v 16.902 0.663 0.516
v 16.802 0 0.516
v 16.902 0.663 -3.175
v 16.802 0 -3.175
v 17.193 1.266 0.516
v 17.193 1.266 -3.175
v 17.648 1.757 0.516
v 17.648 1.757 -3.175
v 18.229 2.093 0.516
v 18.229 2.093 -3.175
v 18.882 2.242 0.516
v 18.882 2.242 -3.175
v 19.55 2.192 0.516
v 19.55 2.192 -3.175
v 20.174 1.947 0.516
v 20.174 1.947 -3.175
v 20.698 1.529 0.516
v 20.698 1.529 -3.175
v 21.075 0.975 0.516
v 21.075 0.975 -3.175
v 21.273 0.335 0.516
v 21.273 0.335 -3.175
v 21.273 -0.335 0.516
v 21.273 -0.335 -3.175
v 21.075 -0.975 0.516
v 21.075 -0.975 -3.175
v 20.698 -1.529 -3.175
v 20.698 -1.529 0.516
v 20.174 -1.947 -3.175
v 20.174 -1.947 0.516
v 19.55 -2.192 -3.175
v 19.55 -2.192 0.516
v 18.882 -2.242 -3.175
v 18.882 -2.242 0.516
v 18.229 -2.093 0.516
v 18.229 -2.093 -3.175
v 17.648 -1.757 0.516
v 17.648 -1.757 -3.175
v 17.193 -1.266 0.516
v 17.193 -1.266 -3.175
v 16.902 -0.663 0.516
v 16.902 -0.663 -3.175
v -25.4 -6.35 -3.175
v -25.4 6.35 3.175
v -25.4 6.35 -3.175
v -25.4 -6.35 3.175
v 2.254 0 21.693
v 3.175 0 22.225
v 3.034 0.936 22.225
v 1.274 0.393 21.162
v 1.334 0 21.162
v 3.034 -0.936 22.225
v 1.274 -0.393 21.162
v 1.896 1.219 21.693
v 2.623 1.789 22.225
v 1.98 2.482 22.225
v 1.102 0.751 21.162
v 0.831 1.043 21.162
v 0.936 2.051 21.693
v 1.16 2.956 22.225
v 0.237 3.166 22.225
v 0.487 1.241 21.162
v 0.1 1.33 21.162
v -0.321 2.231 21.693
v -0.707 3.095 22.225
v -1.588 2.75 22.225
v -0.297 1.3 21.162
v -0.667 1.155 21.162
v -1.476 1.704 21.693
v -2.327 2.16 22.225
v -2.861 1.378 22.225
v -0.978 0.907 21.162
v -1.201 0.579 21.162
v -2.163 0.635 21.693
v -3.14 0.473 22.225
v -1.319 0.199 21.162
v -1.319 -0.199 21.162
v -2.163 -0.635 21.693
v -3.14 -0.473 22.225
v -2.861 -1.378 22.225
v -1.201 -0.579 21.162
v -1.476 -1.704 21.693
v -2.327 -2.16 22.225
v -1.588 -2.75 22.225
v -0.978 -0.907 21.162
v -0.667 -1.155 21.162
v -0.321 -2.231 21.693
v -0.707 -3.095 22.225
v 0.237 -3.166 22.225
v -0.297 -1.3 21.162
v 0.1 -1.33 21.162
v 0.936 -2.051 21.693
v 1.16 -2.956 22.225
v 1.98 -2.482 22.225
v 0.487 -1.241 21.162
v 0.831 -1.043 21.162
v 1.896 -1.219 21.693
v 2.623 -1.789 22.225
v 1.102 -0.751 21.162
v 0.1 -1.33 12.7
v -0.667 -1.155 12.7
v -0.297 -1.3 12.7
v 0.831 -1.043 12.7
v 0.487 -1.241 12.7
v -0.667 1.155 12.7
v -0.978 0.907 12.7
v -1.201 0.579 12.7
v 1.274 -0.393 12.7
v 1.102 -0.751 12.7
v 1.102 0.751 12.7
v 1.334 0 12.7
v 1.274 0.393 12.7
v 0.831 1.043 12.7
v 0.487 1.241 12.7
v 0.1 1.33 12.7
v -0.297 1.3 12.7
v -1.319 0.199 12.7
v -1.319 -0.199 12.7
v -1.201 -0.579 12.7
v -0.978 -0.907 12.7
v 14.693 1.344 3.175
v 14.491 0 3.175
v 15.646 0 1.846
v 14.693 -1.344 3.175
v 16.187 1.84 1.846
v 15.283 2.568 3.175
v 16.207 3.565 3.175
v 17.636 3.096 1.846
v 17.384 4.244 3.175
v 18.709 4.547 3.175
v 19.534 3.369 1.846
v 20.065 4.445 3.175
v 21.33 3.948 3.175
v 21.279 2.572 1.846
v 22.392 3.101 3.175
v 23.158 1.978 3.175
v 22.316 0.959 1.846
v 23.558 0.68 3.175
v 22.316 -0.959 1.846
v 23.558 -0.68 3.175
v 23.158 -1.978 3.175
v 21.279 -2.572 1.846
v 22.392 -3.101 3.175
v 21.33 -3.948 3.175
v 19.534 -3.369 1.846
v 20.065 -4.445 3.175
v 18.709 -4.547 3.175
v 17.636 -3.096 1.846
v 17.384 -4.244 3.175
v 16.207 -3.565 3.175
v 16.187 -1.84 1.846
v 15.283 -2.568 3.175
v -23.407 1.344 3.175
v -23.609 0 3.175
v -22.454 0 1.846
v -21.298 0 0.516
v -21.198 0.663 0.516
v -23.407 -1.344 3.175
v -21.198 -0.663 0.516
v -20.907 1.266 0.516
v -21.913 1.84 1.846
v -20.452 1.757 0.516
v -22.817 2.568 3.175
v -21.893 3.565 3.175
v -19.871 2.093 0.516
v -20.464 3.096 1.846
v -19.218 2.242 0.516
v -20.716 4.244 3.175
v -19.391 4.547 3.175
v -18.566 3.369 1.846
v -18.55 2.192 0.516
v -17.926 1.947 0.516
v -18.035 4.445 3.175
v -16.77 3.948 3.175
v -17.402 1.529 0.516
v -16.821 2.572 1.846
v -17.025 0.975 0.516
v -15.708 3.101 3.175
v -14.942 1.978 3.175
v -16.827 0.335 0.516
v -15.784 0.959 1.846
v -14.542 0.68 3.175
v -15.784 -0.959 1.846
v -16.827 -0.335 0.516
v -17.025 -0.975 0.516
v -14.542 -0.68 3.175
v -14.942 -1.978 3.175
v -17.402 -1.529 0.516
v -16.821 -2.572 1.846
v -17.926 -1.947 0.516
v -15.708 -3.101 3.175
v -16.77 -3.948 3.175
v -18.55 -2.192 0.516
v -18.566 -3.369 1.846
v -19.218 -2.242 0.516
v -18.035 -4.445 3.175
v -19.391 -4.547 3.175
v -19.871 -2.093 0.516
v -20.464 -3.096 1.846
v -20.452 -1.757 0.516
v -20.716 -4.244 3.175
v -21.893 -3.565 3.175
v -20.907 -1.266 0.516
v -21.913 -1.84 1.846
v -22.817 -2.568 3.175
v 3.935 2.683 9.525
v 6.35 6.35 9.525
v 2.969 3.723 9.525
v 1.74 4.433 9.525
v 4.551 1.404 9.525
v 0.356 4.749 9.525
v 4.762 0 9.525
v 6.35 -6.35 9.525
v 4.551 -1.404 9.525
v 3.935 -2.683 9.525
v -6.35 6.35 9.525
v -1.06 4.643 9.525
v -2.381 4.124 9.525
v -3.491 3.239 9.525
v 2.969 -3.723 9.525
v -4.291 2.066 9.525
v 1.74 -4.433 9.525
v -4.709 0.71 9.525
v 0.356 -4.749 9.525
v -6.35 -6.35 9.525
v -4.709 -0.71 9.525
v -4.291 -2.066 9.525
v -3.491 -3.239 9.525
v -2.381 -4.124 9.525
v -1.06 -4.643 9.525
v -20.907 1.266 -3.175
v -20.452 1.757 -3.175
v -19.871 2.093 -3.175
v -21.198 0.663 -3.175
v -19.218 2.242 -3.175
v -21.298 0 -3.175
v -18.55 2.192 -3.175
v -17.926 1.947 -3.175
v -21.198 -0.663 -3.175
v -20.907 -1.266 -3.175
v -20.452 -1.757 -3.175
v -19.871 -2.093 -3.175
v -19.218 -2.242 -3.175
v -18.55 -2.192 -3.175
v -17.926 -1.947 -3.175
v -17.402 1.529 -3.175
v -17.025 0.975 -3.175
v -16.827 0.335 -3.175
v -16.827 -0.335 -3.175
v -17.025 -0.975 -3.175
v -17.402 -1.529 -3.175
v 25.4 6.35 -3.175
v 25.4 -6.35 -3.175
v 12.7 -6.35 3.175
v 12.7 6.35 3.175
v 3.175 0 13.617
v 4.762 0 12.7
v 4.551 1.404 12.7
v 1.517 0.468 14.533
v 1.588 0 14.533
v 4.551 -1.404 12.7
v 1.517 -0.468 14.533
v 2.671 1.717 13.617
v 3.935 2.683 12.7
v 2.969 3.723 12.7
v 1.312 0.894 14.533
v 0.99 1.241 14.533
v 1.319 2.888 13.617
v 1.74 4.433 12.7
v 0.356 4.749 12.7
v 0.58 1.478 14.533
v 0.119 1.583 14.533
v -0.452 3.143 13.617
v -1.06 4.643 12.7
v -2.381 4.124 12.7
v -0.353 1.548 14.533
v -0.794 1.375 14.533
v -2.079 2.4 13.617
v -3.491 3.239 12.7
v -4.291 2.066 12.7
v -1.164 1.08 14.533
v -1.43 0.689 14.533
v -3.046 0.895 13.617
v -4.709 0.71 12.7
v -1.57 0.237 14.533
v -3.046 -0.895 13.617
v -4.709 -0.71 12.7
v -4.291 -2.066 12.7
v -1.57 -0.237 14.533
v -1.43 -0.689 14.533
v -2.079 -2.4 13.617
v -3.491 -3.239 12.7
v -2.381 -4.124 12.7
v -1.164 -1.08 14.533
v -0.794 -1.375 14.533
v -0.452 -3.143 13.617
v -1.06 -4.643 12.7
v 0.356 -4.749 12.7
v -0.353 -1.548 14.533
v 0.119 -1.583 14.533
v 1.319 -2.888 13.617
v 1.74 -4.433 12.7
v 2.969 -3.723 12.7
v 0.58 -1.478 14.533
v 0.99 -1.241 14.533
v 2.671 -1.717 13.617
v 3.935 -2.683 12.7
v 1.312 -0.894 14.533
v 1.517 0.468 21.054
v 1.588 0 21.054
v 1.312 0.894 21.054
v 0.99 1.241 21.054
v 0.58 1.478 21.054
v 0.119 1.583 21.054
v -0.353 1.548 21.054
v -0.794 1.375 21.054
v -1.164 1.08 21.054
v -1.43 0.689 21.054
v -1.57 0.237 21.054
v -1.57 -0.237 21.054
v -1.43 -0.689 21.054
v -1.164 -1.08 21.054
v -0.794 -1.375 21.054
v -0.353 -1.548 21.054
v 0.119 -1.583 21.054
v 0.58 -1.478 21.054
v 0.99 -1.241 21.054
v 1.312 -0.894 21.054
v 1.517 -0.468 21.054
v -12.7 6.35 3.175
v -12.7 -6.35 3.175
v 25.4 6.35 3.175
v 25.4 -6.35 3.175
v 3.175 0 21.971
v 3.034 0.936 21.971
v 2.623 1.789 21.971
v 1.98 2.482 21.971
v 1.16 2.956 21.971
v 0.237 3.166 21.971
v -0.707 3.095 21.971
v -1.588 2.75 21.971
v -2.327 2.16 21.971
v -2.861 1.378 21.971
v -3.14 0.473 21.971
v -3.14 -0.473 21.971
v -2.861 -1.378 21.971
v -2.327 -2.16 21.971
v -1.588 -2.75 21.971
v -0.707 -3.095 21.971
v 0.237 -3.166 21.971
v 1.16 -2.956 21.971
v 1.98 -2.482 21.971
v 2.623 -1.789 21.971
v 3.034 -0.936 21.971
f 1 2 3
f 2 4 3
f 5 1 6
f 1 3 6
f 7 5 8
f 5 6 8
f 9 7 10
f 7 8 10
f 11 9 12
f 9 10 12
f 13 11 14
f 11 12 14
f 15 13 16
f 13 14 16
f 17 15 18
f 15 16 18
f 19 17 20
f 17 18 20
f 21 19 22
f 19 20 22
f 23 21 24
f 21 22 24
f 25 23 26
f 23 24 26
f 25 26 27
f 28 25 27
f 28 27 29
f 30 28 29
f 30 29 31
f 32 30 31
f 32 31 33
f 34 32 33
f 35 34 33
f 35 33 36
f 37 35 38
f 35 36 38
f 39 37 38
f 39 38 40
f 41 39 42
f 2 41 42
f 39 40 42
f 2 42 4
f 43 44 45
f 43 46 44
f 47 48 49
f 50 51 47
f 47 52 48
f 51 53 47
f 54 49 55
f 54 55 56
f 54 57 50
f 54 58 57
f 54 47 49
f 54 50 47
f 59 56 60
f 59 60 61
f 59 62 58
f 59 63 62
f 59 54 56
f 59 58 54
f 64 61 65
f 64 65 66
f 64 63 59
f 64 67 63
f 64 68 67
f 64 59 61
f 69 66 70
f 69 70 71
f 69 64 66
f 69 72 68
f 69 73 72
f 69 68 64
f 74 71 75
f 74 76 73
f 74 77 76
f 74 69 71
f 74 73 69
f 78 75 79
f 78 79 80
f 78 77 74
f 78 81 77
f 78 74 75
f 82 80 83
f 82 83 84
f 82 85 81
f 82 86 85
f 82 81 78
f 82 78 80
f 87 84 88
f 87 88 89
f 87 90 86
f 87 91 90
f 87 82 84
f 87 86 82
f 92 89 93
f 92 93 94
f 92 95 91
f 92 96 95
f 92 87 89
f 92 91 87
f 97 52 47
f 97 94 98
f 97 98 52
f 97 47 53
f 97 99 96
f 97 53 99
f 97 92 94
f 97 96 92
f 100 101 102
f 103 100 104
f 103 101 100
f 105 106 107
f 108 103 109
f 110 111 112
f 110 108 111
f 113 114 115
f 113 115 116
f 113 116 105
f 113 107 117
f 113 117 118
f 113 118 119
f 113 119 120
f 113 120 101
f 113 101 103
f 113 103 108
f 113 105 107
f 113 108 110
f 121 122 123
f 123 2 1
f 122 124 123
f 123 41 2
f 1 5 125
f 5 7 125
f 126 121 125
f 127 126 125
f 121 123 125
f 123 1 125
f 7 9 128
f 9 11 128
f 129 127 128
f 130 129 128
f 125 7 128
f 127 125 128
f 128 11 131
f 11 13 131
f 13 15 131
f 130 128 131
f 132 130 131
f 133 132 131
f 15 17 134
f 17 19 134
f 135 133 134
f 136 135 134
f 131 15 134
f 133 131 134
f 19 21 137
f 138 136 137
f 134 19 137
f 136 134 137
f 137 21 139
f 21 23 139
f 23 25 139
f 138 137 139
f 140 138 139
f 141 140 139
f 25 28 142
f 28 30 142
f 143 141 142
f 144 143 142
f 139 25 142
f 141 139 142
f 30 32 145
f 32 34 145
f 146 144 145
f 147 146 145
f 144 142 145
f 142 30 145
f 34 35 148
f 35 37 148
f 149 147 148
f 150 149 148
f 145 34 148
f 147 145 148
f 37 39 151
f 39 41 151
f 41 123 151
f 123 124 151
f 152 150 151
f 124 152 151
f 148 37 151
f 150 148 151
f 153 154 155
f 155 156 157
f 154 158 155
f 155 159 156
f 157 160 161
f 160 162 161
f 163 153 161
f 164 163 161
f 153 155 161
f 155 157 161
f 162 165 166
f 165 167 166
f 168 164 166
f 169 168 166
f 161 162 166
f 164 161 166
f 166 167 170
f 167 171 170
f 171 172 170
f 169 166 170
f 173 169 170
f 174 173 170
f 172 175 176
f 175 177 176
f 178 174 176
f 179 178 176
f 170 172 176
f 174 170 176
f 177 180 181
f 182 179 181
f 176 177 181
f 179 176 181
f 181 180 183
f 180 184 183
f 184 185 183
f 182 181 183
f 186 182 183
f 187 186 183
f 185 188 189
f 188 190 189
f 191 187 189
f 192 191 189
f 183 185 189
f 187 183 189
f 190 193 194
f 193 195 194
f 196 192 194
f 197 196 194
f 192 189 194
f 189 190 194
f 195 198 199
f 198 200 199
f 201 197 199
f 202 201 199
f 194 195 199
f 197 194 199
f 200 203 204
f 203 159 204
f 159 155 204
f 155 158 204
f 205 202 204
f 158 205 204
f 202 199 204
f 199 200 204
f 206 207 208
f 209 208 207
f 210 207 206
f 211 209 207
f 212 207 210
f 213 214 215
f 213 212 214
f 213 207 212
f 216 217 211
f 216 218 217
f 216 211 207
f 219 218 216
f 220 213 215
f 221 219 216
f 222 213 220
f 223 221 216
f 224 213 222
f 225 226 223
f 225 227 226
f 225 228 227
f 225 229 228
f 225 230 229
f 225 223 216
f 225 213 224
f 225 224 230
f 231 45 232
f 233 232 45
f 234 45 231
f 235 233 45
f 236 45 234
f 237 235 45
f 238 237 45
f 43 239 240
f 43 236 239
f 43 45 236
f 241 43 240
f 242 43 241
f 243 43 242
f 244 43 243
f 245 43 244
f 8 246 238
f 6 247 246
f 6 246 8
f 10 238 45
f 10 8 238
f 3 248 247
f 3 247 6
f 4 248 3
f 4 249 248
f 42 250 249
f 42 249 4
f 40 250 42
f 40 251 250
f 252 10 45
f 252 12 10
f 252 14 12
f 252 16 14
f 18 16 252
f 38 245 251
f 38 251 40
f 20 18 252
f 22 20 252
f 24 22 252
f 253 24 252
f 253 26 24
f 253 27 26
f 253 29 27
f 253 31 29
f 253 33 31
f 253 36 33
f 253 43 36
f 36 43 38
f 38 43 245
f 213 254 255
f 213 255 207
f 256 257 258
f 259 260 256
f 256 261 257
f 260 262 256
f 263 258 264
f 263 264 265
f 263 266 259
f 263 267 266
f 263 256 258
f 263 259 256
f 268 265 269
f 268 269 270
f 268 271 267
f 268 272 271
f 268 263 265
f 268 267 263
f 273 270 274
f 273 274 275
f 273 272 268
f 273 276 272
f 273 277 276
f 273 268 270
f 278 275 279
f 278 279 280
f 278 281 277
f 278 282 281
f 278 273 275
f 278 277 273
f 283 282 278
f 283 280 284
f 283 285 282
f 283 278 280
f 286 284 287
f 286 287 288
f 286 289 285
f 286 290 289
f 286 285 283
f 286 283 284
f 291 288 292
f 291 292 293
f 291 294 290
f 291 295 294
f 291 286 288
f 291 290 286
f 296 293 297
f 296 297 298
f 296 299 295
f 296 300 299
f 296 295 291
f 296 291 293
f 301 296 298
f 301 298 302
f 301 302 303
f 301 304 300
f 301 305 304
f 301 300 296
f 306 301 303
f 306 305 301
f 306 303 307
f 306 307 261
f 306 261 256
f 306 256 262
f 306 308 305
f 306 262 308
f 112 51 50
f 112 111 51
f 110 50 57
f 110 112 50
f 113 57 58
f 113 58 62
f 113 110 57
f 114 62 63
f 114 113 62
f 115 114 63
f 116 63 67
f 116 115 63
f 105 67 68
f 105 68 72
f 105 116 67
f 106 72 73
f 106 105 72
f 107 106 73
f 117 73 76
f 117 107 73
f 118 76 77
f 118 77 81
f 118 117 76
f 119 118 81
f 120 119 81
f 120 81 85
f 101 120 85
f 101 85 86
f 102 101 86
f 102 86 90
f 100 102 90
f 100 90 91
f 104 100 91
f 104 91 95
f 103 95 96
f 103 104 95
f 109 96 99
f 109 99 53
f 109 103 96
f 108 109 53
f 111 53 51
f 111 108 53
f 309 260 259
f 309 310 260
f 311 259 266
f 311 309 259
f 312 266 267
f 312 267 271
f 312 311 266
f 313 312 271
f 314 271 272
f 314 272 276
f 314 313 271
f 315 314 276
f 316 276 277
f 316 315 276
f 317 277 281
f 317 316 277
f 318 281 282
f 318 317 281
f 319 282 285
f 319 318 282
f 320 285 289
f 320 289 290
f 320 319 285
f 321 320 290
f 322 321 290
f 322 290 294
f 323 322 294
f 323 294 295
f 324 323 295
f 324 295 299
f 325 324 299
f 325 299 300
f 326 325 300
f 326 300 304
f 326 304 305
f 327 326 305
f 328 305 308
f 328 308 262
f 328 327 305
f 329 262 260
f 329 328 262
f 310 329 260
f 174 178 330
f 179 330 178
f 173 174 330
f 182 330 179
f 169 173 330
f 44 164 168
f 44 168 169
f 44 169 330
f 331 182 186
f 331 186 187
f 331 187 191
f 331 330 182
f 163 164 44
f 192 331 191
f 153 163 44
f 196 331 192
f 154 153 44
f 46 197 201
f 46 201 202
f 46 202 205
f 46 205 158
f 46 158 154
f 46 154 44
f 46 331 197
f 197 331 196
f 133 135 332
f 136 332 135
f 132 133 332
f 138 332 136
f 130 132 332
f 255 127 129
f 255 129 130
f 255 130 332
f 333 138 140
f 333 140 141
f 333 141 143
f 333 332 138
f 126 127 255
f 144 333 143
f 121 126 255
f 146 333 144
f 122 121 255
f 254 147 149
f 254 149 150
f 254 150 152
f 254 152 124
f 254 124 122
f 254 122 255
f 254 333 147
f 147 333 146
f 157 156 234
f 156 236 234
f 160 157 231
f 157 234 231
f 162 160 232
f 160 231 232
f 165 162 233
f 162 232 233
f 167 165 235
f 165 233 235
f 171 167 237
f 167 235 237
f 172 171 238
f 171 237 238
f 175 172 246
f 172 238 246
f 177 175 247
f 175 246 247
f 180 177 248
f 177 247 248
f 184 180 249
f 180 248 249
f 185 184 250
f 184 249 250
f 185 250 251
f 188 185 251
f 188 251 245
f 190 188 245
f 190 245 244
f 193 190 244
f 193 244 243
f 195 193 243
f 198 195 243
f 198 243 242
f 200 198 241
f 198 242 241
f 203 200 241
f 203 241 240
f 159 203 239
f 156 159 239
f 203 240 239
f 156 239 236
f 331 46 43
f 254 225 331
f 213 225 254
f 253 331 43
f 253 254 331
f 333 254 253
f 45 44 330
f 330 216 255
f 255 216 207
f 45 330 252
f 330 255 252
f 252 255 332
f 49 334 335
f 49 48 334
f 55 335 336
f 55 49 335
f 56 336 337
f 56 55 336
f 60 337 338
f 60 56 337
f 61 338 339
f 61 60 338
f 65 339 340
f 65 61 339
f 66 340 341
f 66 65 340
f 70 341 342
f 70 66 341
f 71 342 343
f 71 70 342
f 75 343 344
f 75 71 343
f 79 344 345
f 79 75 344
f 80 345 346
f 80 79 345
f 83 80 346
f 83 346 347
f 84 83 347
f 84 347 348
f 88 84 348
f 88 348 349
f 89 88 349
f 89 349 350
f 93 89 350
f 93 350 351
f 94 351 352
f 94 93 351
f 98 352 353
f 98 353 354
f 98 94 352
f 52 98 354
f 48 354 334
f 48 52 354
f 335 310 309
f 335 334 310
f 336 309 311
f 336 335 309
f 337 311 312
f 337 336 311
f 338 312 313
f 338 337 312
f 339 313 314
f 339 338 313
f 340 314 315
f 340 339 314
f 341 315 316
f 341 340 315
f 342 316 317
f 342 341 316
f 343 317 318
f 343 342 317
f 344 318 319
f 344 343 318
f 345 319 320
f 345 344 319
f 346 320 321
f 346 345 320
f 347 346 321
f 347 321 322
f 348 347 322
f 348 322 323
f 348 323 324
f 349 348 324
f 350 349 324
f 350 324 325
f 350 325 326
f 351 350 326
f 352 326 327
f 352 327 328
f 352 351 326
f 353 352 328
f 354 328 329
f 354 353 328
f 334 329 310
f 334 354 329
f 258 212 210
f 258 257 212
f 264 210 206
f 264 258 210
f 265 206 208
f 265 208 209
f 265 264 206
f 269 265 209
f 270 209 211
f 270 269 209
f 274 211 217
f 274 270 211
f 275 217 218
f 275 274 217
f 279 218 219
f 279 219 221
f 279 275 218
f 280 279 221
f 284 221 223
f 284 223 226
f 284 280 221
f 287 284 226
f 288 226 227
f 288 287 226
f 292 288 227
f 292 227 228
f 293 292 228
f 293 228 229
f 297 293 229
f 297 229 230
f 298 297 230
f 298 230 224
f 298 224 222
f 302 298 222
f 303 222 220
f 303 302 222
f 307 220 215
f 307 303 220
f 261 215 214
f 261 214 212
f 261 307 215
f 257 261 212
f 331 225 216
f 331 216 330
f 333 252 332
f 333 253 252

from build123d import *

# Parameters (mm, degrees)
F1_DEPTH       = 6.35
F3_D           = 4.4958
F3_CSINK_D     = 9.1186
F3_CSINK_ANGLE = 82


with BuildPart() as f1:
    # F0 (on Front) → F1 (new body, symmetric)
    with BuildSketch(Plane.XZ):
        Polygon((25.4, -3.175), (25.4, 3.175), (12.7, 3.175), (6.35, 9.525), (-6.35, 9.525), (-12.7, 3.175), (-25.4, 3.175), (-25.4, -3.175), align=None)
    extrude(amount=F1_DEPTH, both=True)

    # F3 (through all)
    with Locations(Plane.XY.offset(3.175)):
        with Locations((-19.05, 0), (19.05, 0)):
            CounterSinkHole(F3_D / 2, F3_CSINK_D / 2, counter_sink_angle=F3_CSINK_ANGLE)

    # F4 (on Front) → F5 (revolve)
    with BuildSketch(Plane.XZ):
        Polygon((0, 12.7), (0, 9.525), (4.7625, 9.525), (4.7625, 12.7), (1.5875, 14.5330871047), (1.5875, 21.0544564477), (3.175, 21.971), (3.175, 22.225), (1.3335, 21.1618094793), (1.3335, 12.7), align=None)
    revolve(axis=Axis((0, 0, 11.1125), (0, 0, 1)))


solid = f1.part
